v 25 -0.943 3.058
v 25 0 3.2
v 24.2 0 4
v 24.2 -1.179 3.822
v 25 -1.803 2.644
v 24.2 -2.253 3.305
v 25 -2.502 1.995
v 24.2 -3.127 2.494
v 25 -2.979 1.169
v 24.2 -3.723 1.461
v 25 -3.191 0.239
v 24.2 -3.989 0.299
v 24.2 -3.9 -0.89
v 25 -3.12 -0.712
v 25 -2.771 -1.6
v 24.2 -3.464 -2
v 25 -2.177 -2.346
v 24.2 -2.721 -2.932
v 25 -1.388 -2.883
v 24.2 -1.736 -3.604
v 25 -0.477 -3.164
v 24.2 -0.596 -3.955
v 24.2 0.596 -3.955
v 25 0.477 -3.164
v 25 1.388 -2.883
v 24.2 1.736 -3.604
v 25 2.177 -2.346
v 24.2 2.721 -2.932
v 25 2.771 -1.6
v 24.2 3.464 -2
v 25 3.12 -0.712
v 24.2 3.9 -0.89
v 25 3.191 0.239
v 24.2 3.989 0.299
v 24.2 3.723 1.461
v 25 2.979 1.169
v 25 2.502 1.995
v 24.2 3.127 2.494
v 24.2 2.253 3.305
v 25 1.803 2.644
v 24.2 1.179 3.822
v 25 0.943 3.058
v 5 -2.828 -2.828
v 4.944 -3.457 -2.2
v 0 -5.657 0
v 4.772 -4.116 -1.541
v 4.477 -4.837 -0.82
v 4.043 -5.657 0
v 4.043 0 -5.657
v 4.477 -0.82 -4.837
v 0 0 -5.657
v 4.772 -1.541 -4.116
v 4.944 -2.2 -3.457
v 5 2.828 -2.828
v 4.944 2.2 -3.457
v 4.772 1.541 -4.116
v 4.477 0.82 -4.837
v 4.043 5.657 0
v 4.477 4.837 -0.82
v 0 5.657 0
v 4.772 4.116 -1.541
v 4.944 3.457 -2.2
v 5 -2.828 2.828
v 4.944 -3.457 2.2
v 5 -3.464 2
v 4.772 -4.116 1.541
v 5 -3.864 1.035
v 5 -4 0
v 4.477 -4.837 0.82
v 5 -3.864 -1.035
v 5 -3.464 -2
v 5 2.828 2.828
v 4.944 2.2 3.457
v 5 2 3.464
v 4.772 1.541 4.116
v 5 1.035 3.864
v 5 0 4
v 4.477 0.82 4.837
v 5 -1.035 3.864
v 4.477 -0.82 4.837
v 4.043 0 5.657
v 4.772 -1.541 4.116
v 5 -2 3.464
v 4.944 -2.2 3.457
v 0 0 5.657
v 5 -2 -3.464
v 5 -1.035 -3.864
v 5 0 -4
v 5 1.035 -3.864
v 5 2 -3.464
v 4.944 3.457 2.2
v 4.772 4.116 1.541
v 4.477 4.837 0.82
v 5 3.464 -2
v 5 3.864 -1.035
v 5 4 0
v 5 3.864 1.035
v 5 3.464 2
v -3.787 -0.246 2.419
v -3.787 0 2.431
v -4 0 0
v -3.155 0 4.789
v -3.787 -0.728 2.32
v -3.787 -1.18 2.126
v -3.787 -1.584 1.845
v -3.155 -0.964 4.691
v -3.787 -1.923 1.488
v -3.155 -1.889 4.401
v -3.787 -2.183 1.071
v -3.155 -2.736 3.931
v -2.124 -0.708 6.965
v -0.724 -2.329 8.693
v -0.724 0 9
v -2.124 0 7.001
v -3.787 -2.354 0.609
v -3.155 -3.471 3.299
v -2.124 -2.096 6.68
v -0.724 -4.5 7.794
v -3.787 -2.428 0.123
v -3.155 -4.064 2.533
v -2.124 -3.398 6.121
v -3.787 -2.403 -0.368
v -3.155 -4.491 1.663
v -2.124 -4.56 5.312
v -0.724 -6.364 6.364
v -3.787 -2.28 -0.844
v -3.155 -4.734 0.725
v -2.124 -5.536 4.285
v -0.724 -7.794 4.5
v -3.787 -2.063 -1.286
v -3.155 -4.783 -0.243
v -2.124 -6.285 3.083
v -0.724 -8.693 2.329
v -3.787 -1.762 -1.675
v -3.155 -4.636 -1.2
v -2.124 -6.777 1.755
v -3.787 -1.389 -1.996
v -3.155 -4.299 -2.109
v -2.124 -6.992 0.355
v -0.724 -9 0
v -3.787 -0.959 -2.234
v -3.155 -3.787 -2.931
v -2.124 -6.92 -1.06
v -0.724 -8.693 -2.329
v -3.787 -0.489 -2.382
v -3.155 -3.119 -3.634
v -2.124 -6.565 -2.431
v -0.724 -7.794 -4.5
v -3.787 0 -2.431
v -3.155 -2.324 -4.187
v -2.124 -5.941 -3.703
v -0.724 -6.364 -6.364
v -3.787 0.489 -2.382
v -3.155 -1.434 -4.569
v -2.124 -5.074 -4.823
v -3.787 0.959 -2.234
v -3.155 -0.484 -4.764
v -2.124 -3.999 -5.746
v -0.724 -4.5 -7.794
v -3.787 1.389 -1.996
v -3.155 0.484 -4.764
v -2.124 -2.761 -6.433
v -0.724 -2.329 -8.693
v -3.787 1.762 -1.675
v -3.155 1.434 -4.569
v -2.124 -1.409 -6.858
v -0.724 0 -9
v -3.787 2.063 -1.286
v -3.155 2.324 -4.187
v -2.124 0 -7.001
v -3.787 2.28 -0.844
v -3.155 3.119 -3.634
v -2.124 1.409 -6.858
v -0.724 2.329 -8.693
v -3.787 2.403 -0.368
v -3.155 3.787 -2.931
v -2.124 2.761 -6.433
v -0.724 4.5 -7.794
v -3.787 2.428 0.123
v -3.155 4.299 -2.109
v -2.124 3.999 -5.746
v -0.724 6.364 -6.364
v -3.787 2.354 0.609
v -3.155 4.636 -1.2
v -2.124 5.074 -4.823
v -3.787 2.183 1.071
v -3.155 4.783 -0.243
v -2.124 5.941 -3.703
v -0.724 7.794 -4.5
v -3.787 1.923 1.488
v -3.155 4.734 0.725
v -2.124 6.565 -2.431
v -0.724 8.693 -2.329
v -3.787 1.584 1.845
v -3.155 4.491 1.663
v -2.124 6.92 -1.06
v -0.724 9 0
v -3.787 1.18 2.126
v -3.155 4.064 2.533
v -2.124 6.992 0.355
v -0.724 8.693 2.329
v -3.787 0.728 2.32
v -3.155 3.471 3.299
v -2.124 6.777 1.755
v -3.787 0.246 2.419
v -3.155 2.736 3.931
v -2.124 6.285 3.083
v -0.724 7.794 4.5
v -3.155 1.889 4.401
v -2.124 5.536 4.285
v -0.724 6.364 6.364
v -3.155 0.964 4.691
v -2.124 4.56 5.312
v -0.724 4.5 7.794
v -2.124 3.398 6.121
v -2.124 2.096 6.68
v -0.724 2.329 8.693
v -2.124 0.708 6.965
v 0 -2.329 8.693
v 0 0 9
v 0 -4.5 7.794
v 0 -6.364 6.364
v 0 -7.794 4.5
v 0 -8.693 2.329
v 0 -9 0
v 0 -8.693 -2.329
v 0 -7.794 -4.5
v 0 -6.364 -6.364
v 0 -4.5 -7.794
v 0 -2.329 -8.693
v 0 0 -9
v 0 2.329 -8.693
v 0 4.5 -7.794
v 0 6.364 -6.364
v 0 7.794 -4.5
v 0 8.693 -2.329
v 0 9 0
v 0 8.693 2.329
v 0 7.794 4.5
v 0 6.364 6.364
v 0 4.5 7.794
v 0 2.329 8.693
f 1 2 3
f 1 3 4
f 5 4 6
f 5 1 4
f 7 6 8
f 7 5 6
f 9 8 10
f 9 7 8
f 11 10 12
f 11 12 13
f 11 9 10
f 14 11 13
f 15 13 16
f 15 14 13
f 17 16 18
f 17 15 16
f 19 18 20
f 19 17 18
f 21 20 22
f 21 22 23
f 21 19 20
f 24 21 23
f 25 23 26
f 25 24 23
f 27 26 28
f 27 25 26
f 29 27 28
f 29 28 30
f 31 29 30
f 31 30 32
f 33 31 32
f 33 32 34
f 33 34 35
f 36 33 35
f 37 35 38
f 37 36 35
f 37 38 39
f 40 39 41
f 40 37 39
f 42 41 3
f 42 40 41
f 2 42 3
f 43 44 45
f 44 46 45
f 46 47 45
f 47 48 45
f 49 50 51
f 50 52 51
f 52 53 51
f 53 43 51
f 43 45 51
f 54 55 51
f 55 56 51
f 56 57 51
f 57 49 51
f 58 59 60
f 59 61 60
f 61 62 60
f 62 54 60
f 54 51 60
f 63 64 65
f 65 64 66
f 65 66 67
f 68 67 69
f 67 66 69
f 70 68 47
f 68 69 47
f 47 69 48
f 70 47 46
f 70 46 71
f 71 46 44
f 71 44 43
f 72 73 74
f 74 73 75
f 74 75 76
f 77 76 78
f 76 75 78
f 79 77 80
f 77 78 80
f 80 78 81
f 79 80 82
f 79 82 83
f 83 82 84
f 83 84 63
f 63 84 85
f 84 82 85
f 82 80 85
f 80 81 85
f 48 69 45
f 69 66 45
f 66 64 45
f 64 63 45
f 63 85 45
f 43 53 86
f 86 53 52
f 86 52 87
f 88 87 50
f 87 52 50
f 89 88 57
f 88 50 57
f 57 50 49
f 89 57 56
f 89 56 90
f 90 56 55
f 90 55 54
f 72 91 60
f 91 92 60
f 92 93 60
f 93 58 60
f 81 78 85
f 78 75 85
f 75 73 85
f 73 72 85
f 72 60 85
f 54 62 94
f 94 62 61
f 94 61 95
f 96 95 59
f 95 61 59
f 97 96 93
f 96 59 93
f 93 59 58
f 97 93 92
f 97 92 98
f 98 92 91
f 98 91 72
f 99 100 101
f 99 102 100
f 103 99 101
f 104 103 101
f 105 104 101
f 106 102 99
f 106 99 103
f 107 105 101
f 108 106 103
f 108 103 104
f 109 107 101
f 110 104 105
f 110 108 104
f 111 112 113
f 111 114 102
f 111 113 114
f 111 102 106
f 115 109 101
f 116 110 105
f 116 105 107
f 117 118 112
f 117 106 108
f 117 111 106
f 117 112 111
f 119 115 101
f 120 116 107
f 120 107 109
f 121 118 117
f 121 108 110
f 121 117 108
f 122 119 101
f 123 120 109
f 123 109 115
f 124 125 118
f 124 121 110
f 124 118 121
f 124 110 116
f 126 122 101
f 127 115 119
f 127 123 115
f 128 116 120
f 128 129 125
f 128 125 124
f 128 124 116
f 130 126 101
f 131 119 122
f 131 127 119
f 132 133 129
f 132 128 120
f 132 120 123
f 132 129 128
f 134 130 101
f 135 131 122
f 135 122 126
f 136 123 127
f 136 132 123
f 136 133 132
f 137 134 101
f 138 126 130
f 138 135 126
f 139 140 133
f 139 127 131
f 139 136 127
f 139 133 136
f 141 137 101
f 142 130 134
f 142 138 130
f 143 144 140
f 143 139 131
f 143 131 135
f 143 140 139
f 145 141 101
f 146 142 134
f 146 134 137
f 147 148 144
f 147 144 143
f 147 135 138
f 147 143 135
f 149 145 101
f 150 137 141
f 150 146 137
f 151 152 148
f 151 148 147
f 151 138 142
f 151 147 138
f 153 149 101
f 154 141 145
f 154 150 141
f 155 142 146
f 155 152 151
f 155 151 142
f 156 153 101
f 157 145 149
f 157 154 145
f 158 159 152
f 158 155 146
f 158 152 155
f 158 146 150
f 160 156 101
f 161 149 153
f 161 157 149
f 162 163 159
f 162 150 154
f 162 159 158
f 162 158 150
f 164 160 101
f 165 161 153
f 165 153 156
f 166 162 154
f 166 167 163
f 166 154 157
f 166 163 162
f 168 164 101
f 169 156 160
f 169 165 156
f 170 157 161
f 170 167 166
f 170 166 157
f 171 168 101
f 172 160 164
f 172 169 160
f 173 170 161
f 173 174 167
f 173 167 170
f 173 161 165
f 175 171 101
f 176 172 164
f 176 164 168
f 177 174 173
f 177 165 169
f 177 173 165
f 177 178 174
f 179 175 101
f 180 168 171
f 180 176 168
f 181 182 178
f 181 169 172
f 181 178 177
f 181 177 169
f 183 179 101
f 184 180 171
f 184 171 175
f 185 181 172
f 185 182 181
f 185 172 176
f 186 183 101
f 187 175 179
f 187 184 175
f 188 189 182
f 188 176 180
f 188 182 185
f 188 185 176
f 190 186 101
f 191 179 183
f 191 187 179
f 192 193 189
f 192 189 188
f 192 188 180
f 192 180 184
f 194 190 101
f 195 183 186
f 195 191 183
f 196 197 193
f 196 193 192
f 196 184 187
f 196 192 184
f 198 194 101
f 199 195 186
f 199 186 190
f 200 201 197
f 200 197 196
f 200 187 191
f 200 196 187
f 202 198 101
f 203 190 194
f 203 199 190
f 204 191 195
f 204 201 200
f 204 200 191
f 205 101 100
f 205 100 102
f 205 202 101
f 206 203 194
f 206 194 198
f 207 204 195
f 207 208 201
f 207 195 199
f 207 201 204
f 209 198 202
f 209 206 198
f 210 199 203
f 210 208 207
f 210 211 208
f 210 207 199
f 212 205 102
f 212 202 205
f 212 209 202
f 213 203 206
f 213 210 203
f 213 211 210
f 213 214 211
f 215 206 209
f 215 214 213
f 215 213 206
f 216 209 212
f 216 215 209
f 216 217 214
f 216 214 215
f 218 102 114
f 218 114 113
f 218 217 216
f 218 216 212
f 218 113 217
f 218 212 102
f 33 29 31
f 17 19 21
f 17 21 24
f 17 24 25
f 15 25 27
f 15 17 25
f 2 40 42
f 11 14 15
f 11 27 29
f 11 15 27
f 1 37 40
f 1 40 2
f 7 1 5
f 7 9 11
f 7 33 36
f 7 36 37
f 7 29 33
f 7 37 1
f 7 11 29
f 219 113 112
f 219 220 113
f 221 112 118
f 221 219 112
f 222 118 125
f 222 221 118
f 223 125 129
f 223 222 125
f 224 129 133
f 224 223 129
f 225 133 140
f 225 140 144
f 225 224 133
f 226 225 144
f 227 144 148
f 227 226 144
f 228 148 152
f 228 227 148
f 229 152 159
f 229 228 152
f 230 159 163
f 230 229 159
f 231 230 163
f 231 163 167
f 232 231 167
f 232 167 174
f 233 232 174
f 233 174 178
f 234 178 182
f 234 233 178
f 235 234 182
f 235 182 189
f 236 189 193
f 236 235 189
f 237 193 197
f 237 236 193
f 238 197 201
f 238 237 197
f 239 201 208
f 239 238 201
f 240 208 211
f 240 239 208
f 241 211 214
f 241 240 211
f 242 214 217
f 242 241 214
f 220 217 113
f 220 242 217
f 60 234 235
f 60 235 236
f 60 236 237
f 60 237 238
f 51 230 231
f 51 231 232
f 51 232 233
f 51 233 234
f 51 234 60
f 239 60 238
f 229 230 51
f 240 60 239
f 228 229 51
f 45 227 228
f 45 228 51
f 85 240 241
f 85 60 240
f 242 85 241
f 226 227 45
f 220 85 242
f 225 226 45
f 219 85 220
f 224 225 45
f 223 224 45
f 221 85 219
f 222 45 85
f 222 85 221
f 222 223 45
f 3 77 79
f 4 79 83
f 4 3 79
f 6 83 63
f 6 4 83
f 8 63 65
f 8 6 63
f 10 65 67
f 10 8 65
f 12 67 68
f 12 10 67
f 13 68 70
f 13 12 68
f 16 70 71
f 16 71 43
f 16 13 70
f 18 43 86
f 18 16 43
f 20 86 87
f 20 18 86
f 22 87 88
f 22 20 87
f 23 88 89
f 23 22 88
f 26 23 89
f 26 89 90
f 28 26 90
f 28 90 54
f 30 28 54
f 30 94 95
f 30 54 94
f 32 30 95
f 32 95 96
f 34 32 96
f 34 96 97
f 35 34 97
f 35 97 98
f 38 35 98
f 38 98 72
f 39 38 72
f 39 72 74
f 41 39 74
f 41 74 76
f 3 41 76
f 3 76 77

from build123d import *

# Parameters (mm, degrees)
EXTRUDE_1_DEPTH = 5
CHAMFER_1_SIZE  = 0.8


with BuildPart() as part:
    # Эскиз1 → Повернуть1 (revolve)
    with BuildSketch(Plane.XY, mode=Mode.PRIVATE) as revolve_1_sk:
        with BuildLine():
            Line((-0.723805295, 9), (0, 9))
            Line((0, 9), (0, 4))
            Line((0, 4), (25, 4))
            Line((25, 4), (25, 0))
            Line((25, 0), (-4, 0))
            ThreePointArc((-4, 0), (-3.155479355, 4.78887909), (-0.723805295, 9))
        make_face()
    revolve(revolve_1_sk.sketch.rotate(Axis((-168.009043504, 0, 0), (1, 0, 0)), 90), axis=Axis((-168.009043504, 0, 0), (1, 0, 0)))

    # Эскиз2 → Бобышка-Вытянуть1 (add)
    with BuildSketch(Plane(origin=(0, 0, 0), x_dir=(0, 0, -1), z_dir=(1, 0, 0))):
        Polygon((0, 5.656854249), (-5.656854249, 0), (0, -5.656854249), (5.656854249, 0), align=None)
    extrude(amount=EXTRUDE_1_DEPTH)

    # Эскиз3 → Вырез-Повернуть1 (revolve, cut)
    with BuildSketch(Plane.XY):
        Polygon((5, 4), (4.043414753, 5.656854249), (5, 5.656854249), align=None)
    revolve(axis=Axis((-1000, 0, 0), (1, 0, 0)), mode=Mode.SUBTRACT)

    # Фаска1
    chamfer_1_edges = [part.edges().sort_by_distance(p)[0] for p in [
        (25, 0, -4),
    ]]
    chamfer(chamfer_1_edges, length=CHAMFER_1_SIZE)


solid = part.part
